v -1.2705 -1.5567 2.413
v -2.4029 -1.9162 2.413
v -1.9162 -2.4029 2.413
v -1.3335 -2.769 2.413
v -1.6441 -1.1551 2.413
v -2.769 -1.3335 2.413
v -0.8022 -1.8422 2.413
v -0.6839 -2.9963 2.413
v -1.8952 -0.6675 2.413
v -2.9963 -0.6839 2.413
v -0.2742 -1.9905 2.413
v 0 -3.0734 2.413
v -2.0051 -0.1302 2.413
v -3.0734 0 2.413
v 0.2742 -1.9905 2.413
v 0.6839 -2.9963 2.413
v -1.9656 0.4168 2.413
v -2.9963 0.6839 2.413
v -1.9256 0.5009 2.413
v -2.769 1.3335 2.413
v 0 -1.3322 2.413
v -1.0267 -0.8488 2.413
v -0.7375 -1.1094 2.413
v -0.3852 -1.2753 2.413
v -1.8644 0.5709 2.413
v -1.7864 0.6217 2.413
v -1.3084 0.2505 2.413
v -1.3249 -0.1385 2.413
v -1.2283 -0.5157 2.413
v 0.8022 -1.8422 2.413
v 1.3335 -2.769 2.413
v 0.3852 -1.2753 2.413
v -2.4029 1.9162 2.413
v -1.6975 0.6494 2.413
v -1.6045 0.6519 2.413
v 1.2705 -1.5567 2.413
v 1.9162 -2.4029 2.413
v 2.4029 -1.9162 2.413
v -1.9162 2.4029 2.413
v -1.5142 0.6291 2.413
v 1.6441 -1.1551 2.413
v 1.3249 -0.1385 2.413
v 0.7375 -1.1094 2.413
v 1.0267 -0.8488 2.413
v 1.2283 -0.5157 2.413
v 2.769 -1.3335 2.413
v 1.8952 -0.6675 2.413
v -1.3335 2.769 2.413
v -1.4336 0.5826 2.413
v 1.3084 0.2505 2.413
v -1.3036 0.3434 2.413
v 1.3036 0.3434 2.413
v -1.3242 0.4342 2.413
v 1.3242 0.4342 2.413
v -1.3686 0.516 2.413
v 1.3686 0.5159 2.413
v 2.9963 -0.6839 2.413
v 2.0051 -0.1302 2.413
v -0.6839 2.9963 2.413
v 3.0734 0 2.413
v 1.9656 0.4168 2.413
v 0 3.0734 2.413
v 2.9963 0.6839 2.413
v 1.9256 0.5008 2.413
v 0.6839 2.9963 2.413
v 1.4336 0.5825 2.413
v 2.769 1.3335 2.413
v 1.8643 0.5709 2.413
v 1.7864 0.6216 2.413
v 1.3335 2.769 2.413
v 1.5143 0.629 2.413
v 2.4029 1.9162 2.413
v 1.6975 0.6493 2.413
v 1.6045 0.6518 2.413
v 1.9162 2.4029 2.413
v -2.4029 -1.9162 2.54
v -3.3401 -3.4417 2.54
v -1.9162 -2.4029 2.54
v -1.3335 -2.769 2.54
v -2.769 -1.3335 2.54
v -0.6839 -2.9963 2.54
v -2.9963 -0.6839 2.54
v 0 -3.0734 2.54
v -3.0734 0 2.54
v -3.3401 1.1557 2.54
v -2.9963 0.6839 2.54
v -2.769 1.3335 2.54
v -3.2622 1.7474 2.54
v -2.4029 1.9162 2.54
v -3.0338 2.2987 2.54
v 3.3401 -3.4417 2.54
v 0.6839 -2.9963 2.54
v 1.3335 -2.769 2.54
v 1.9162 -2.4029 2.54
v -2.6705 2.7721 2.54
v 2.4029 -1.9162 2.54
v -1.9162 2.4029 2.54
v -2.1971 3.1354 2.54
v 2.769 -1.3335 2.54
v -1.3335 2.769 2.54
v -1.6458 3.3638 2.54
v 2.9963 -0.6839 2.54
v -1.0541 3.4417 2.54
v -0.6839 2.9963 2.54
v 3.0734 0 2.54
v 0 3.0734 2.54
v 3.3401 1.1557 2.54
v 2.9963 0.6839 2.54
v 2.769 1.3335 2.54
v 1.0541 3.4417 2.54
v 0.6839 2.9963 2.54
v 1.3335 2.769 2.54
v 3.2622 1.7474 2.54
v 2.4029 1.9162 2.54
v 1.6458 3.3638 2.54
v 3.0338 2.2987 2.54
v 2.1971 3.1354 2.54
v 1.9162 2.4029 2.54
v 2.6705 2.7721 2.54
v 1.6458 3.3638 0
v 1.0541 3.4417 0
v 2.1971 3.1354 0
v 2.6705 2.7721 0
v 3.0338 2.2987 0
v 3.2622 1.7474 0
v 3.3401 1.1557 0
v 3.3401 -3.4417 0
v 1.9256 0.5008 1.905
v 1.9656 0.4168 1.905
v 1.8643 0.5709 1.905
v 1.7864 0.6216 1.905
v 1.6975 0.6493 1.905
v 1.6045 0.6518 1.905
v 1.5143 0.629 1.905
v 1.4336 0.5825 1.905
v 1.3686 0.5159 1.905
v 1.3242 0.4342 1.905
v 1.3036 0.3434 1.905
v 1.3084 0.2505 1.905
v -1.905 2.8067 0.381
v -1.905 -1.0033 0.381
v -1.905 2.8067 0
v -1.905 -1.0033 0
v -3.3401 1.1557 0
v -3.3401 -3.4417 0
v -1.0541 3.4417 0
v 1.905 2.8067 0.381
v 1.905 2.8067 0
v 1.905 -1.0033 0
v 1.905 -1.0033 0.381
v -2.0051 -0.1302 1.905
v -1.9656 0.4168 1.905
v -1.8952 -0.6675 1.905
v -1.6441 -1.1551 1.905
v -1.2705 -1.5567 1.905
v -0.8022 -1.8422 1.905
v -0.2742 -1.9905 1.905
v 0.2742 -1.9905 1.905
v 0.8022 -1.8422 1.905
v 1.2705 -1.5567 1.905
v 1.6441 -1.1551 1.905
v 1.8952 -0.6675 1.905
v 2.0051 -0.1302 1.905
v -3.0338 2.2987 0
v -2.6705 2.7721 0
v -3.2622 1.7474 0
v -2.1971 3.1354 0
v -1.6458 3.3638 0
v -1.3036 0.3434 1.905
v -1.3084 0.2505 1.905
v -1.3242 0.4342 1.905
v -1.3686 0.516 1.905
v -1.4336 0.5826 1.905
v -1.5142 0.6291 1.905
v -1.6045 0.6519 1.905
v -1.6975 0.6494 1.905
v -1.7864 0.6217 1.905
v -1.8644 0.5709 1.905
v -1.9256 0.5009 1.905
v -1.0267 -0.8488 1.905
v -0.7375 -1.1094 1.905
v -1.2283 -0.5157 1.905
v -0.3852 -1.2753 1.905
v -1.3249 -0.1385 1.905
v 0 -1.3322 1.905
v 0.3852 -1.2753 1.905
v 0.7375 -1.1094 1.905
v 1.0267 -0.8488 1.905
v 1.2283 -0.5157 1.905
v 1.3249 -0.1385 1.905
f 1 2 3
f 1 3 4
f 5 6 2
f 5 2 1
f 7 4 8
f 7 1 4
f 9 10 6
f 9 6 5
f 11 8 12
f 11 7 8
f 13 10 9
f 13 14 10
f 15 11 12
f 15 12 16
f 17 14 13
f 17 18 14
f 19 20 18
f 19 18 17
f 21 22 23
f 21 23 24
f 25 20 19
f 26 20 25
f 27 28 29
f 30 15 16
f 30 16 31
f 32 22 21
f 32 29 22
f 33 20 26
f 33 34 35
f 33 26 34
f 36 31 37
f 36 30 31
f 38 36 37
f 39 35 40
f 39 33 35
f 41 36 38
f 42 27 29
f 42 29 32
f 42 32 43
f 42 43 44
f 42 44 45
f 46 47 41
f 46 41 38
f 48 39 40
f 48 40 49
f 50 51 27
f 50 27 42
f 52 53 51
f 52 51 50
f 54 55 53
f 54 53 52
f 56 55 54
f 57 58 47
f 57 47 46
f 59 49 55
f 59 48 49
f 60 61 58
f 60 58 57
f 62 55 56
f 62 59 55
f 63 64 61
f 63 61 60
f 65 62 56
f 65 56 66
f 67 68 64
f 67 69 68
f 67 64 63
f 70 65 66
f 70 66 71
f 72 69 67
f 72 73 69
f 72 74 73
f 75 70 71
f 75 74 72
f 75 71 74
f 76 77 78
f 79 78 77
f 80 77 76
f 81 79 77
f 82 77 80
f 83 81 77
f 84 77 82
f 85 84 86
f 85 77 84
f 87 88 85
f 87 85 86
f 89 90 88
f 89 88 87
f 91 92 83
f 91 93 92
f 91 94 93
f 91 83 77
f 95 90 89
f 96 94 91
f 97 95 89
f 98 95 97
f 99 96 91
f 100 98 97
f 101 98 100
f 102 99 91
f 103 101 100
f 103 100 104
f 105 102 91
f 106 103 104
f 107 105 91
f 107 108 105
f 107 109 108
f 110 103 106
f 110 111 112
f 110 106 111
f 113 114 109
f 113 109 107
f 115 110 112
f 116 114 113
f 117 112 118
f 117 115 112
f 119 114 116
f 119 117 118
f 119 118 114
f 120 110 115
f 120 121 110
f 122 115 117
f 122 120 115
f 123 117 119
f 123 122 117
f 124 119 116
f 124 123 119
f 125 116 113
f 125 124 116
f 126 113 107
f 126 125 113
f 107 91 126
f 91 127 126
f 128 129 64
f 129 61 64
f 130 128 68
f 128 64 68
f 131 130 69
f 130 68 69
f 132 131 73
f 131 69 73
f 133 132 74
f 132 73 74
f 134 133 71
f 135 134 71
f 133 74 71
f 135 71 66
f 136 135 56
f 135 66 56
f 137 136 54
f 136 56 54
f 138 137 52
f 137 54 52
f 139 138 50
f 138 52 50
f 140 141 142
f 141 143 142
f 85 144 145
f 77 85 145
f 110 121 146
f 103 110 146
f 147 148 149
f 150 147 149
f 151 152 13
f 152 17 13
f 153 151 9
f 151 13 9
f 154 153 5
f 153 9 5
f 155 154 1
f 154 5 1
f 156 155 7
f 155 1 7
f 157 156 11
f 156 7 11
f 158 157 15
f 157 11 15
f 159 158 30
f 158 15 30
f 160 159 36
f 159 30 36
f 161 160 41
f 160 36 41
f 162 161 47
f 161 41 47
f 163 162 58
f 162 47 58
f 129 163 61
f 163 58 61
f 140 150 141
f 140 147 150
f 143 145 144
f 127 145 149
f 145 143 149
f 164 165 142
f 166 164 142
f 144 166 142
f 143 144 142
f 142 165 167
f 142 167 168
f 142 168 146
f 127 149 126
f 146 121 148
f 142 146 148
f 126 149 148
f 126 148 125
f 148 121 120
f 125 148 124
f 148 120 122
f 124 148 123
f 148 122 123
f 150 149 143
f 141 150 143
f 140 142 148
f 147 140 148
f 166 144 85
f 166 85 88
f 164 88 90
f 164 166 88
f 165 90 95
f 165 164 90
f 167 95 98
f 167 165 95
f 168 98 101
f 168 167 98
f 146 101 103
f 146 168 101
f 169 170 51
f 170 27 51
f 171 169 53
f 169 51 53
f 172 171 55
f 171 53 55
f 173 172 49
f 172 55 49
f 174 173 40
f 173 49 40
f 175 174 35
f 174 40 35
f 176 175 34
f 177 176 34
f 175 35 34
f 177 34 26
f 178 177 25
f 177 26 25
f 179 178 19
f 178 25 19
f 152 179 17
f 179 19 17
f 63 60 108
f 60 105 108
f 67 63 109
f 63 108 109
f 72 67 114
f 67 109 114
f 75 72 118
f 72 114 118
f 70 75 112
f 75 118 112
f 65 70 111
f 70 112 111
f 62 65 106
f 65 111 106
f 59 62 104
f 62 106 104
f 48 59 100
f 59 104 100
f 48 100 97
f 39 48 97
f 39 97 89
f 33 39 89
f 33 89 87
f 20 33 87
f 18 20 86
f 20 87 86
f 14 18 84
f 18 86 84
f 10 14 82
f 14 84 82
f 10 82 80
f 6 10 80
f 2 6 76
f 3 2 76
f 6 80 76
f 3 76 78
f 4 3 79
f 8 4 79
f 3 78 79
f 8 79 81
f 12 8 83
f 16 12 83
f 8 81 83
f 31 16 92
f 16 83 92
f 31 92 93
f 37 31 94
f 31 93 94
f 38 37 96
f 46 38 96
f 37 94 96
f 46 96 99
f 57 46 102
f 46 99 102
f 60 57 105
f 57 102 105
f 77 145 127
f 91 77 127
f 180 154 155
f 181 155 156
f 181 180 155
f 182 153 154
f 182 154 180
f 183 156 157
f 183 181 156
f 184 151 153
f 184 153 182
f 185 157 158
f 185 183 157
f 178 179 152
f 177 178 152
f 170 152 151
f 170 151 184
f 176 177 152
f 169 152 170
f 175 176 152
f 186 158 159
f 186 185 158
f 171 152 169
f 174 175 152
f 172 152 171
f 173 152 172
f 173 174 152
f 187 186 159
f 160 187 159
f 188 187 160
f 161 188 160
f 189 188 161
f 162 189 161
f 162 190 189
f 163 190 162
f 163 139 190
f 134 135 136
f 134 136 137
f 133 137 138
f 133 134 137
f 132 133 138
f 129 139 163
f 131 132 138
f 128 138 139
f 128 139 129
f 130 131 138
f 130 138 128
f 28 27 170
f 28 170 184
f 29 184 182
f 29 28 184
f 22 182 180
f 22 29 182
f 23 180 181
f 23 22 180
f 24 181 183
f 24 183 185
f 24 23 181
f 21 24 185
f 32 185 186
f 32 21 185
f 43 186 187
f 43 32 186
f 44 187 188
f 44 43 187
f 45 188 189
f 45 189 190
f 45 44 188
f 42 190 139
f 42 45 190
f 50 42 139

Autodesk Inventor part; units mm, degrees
ref_plane "YZ Plane" through (0, 0, 0) normal (1, 0, 0) x (0, 1, 0)
ref_plane "XZ Plane" through (0, 0, 0) normal (0, 1, 0) x (-1, 0, 0)
ref_plane "XY Plane" through (0, 0, 0) normal (0, 0, 1) x (1, 0, 0)
sketch "Sketch1" plane through (0, 0, 0) normal (0, 0, 1) x (1, 0, 0)
  line L0 (-3.3401, -3.4417) -> (3.3401, -3.4417)
  line L1 (3.3401, -3.4417) -> (3.3401, 1.1557)
  line L2 (1.0541, 3.4417) -> (-1.0541, 3.4417)
  line L3 (-3.3401, 1.1557) -> (-3.3401, -3.4417)
  line L4 (-3.3401, -3.4417) -> (3.3401, 3.4417) construction
  line L5 (3.3401, -3.4417) -> (-3.3401, 3.4417) construction
  arc A0 (-1.0541, 3.4417) -> (-3.3401, 1.1557) centre (-1.0541, 1.1557) ccw
  arc A1 (3.3401, 1.1557) -> (1.0541, 3.4417) centre (1.0541, 1.1557) ccw
  point P0 (0, 0)
  dimension "d0" = 6.6802
  dimension "d1" = 6.8834
  dimension "d2" = 2.286
extrude "Extrusion1" add sketch "Sketch1" along normal blind 2.54
sketch "Sketch2" plane through (0, 0, 2.54) normal (0, 0, 1) x (1, 0, 0)
  circle A0 centre (0, 0) radius 3.0734
  dimension "d5" = 6.1468
extrude "Extrusion2" cut sketch "Sketch2" against normal blind 0.127
sketch "Sketch4" plane through (0, 0, 2.413) normal (0, 0, 1) x (1, 0, 0)
  circle A0 centre (0, 0) radius 3.0734 projected
  arc A1 (-1.9656, 0.4168) -> (1.9656, 0.4168) centre (0, 0) ccw
  arc A2 (-1.3084, 0.2505) -> (1.3084, 0.2505) centre (0, 0) ccw
  circle A3 centre (1.6419, 0.3144) radius 0.3175 projected
  line L0 (0, 0) -> (0, 0.9465)
  arc A4 (1.9656, 0.4168) -> (1.3084, 0.2505) centre (1.6419, 0.3144) ccw
  arc A5 (-1.3084, 0.2505) -> (-1.9656, 0.4168) centre (-1.6419, 0.3144) ccw
  dimension "d8" = 0.6772
extrude "Extrusion3" cut sketch "Sketch4" against normal blind 0.508 contours A5 A2 A4 A1
sketch "Sketch5" plane through (1.6419, 0.3144, 2.413) normal (0, 0, 1) x (1, 0, 0)
  circle A0 centre (0, 0) radius 0.3175 projected
  point P0 (-1.6419, -0.3144)
extrude "Extrusion4" cut sketch "Sketch5" against normal blind 0.508
sketch "Sketch6" plane through (0, 0, 0) normal (0, 0, -1) x (-1, 0, 0)
  line L0 (3.3401, 1.1557) -> (3.3401, -3.4417) projected
  line L1 (-1.0541, 3.4417) -> (1.0541, 3.4417) projected
  line L2 (-3.3401, -3.4417) -> (-3.3401, 1.1557) projected
  line L3 (-1.905, -1.0033) -> (1.905, -1.0033)
  line L4 (1.905, -1.0033) -> (1.905, 2.8067)
  line L5 (1.905, 2.8067) -> (-1.905, 2.8067)
  line L6 (-1.905, 2.8067) -> (-1.905, -1.0033)
  point P0 (0, 0)
  dimension "d13" = 3.81
  dimension "d14" = 3.81
  dimension "d15" = 6.6802
  dimension "d16" = 1.4351
  dimension "d17" = 0.635
extrude "Extrusion5" cut sketch "Sketch6" against normal blind 0.381
equation "\"d16\" = -0.5 * d13 + 0.5 * d15"
properties part number "trim pot_ body"
